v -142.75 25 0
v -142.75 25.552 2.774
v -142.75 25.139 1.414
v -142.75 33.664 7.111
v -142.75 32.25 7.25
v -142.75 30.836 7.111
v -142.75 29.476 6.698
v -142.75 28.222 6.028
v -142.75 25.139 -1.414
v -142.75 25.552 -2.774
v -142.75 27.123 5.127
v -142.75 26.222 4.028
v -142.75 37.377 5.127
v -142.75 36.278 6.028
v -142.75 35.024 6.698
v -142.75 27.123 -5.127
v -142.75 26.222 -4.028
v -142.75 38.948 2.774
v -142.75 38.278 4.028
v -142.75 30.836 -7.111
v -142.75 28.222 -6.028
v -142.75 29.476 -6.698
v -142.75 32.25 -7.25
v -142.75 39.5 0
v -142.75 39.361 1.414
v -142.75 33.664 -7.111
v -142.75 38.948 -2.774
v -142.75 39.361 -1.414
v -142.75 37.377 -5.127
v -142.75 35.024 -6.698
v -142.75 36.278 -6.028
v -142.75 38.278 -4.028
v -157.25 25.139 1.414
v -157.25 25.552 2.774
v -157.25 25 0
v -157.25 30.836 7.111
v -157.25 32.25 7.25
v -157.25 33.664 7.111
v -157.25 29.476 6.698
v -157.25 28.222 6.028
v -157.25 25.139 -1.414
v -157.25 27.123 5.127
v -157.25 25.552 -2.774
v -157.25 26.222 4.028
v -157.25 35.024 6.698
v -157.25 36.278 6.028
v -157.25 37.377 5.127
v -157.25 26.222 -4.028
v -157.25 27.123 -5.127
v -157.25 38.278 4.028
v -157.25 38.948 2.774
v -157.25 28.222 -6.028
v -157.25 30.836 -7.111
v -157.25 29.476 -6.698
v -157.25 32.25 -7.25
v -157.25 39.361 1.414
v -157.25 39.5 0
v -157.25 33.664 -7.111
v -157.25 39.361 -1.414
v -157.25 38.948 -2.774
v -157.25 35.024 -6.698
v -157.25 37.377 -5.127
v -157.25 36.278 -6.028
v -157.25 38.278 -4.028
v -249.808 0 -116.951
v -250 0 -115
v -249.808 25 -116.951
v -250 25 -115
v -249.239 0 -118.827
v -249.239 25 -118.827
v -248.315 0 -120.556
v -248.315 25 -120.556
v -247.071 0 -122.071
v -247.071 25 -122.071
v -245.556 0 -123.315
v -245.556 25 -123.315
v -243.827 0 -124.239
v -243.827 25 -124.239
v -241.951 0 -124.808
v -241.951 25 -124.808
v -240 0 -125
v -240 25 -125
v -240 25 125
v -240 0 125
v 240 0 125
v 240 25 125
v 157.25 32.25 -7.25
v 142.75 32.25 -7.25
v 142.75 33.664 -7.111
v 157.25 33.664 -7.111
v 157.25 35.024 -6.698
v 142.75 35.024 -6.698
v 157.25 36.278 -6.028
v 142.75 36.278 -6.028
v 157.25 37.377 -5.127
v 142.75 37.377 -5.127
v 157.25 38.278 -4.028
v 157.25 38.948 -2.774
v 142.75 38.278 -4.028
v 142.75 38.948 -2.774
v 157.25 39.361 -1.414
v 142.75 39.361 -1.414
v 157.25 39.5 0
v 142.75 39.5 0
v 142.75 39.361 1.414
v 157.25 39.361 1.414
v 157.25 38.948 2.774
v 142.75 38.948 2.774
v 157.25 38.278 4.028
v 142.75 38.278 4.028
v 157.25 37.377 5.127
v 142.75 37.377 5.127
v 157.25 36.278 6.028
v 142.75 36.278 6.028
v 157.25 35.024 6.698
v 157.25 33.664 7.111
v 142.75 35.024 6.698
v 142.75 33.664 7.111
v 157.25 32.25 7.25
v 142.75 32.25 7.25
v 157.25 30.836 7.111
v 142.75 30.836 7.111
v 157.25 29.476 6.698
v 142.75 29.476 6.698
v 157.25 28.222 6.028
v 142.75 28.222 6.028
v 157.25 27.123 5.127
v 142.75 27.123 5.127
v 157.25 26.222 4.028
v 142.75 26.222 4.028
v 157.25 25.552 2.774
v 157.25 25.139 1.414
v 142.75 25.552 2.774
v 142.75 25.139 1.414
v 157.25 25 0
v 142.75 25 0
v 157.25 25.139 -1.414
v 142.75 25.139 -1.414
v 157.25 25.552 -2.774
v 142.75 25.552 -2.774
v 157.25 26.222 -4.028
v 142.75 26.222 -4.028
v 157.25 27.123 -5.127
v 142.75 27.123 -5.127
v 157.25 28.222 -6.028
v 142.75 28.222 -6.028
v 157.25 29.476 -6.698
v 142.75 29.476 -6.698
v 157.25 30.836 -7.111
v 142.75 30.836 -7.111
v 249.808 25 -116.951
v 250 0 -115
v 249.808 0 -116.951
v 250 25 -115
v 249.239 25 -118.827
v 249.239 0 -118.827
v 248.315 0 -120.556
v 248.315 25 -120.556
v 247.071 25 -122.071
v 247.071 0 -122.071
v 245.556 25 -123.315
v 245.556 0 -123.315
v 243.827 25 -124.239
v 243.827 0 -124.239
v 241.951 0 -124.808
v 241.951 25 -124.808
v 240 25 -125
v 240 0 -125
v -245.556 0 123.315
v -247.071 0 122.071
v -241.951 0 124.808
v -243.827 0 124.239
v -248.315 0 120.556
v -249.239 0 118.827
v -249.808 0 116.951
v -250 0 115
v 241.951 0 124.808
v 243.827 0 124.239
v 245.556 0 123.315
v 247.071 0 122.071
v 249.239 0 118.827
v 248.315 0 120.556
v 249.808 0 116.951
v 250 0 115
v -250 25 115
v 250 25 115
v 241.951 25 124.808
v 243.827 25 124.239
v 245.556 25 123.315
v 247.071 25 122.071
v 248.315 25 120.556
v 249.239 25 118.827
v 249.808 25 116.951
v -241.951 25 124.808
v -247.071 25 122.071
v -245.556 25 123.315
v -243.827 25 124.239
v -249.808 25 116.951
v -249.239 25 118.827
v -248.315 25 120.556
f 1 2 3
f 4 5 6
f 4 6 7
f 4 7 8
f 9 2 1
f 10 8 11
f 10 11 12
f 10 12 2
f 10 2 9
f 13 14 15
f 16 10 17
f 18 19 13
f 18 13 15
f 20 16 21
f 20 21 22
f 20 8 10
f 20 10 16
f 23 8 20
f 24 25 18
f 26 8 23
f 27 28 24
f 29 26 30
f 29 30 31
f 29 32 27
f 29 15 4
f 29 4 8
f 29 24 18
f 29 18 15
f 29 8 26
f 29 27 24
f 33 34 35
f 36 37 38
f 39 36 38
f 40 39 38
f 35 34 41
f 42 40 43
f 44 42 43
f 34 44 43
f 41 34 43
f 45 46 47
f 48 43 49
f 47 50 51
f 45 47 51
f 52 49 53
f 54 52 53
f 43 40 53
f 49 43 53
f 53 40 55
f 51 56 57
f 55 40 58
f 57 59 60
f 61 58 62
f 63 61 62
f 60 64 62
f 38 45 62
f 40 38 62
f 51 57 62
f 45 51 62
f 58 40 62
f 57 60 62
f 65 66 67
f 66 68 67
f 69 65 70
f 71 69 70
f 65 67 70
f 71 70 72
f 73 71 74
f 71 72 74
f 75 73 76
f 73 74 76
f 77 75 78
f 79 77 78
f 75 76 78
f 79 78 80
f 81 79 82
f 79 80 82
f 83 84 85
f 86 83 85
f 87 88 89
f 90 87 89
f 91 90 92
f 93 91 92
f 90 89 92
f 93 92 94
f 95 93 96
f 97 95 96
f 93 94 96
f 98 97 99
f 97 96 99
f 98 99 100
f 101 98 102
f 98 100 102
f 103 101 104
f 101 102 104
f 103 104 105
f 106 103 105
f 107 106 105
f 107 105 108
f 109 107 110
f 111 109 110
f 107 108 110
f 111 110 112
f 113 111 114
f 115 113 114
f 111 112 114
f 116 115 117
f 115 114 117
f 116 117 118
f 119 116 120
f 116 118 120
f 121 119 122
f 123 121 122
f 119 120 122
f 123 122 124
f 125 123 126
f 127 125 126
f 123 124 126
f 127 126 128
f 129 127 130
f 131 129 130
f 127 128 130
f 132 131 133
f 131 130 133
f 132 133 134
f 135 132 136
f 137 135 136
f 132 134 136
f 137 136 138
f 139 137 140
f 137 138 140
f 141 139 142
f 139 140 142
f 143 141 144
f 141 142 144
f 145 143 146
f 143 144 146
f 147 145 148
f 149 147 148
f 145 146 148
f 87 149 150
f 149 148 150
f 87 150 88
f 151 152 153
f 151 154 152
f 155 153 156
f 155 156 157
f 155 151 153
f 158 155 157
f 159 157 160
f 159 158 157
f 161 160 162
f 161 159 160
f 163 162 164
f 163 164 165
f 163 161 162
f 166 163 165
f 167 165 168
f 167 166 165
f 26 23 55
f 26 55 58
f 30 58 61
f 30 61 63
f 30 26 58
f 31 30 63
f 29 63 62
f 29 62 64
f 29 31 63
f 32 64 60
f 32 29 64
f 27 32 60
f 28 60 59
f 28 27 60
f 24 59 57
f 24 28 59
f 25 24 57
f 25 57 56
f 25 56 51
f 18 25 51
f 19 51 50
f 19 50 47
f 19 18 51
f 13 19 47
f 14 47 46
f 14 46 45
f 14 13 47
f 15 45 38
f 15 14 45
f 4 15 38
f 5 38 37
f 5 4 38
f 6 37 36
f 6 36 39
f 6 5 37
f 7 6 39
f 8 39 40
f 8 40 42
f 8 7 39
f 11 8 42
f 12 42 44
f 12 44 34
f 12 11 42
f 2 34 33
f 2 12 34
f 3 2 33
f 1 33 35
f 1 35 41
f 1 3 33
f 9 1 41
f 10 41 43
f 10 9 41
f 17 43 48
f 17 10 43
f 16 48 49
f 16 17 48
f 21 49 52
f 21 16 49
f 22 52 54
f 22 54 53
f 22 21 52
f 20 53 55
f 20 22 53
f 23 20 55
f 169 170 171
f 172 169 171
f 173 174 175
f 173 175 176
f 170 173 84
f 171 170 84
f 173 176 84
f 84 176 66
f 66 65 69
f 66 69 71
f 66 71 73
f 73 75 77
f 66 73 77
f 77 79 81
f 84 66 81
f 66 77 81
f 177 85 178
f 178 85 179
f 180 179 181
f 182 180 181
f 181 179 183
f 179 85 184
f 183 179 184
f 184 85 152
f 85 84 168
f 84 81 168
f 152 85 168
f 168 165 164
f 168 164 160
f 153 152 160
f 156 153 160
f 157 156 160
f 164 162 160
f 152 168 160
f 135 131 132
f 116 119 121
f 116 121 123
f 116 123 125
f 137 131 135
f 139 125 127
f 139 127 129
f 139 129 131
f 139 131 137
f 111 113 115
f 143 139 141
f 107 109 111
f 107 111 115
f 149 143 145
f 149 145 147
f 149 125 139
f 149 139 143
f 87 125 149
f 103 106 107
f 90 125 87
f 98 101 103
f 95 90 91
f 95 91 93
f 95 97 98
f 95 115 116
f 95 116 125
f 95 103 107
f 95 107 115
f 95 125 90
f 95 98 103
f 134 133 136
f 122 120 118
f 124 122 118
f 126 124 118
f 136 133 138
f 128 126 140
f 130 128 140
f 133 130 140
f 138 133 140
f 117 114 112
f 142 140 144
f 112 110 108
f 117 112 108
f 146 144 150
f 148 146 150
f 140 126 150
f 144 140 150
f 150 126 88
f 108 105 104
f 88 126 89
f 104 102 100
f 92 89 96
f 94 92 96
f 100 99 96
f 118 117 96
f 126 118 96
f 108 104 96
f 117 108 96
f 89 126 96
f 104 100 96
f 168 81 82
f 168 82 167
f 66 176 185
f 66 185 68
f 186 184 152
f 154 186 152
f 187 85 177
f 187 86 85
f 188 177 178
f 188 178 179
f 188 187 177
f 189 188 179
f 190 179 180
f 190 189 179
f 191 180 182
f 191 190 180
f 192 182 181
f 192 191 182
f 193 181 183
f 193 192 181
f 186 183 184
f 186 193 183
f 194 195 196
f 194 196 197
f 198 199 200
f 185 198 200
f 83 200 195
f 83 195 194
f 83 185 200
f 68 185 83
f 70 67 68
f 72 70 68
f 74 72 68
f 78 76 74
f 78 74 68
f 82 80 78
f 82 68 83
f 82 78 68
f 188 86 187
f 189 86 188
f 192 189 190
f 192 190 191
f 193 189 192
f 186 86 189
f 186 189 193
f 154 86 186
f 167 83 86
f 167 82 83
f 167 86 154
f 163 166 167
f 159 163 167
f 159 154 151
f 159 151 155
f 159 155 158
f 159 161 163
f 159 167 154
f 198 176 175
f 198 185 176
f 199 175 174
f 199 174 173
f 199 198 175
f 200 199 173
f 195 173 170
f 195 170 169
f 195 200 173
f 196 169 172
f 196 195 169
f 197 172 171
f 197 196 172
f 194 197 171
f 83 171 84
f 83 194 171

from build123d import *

# Parameters (mm, degrees)
SKETCH1_W                = 500
SKETCH1_H                = 250
BOSS_EXTRUDE1_DEPTH      = 25
FILLET1_R                = 10
BOSS_EXTRUDE2_DEPTH      = 7.25
BOSS_EXTRUDE2_DEPTH_BACK = 7.25
SKETCH5_R                = 7.25


with BuildPart() as part:
    # Sketch1 → Boss-Extrude1 (new body)
    with BuildSketch(Plane(origin=(0, 0, 0), x_dir=(1, 0, 0), z_dir=(0, 1, 0))):
        Rectangle(SKETCH1_W, SKETCH1_H)
    extrude(amount=BOSS_EXTRUDE1_DEPTH)

    # Fillet1
    fillet1_edges = [part.edges().sort_by_distance(p)[0] for p in [
        (-250, 12.5, -125),
        (250, 12.5, -125),
        (250, 12.5, 125),
        (-250, 12.5, 125),
    ]]
    fillet(fillet1_edges, radius=FILLET1_R)


with BuildPart() as body_2:
    # Sketch5 → Boss-Extrude2 (new, two sides: drawn at the far end of the back side and taken through both)
    with BuildSketch(Plane(origin=(150, 0, 0), x_dir=(0, 0, -1), z_dir=(1, 0, 0)).offset(-BOSS_EXTRUDE2_DEPTH_BACK)):
        with Locations((0, 32.25)):
            Circle(SKETCH5_R)
    extrude(amount=BOSS_EXTRUDE2_DEPTH + BOSS_EXTRUDE2_DEPTH_BACK)


with BuildPart() as body_3:
    # Mirror3: mirrored copy
    add(body_2.part.mirror(Plane(origin=(0, 0, 0), x_dir=(0, 0, 1), z_dir=(1, 0, 0))))


solid = Compound([part.part, body_2.part, body_3.part])
